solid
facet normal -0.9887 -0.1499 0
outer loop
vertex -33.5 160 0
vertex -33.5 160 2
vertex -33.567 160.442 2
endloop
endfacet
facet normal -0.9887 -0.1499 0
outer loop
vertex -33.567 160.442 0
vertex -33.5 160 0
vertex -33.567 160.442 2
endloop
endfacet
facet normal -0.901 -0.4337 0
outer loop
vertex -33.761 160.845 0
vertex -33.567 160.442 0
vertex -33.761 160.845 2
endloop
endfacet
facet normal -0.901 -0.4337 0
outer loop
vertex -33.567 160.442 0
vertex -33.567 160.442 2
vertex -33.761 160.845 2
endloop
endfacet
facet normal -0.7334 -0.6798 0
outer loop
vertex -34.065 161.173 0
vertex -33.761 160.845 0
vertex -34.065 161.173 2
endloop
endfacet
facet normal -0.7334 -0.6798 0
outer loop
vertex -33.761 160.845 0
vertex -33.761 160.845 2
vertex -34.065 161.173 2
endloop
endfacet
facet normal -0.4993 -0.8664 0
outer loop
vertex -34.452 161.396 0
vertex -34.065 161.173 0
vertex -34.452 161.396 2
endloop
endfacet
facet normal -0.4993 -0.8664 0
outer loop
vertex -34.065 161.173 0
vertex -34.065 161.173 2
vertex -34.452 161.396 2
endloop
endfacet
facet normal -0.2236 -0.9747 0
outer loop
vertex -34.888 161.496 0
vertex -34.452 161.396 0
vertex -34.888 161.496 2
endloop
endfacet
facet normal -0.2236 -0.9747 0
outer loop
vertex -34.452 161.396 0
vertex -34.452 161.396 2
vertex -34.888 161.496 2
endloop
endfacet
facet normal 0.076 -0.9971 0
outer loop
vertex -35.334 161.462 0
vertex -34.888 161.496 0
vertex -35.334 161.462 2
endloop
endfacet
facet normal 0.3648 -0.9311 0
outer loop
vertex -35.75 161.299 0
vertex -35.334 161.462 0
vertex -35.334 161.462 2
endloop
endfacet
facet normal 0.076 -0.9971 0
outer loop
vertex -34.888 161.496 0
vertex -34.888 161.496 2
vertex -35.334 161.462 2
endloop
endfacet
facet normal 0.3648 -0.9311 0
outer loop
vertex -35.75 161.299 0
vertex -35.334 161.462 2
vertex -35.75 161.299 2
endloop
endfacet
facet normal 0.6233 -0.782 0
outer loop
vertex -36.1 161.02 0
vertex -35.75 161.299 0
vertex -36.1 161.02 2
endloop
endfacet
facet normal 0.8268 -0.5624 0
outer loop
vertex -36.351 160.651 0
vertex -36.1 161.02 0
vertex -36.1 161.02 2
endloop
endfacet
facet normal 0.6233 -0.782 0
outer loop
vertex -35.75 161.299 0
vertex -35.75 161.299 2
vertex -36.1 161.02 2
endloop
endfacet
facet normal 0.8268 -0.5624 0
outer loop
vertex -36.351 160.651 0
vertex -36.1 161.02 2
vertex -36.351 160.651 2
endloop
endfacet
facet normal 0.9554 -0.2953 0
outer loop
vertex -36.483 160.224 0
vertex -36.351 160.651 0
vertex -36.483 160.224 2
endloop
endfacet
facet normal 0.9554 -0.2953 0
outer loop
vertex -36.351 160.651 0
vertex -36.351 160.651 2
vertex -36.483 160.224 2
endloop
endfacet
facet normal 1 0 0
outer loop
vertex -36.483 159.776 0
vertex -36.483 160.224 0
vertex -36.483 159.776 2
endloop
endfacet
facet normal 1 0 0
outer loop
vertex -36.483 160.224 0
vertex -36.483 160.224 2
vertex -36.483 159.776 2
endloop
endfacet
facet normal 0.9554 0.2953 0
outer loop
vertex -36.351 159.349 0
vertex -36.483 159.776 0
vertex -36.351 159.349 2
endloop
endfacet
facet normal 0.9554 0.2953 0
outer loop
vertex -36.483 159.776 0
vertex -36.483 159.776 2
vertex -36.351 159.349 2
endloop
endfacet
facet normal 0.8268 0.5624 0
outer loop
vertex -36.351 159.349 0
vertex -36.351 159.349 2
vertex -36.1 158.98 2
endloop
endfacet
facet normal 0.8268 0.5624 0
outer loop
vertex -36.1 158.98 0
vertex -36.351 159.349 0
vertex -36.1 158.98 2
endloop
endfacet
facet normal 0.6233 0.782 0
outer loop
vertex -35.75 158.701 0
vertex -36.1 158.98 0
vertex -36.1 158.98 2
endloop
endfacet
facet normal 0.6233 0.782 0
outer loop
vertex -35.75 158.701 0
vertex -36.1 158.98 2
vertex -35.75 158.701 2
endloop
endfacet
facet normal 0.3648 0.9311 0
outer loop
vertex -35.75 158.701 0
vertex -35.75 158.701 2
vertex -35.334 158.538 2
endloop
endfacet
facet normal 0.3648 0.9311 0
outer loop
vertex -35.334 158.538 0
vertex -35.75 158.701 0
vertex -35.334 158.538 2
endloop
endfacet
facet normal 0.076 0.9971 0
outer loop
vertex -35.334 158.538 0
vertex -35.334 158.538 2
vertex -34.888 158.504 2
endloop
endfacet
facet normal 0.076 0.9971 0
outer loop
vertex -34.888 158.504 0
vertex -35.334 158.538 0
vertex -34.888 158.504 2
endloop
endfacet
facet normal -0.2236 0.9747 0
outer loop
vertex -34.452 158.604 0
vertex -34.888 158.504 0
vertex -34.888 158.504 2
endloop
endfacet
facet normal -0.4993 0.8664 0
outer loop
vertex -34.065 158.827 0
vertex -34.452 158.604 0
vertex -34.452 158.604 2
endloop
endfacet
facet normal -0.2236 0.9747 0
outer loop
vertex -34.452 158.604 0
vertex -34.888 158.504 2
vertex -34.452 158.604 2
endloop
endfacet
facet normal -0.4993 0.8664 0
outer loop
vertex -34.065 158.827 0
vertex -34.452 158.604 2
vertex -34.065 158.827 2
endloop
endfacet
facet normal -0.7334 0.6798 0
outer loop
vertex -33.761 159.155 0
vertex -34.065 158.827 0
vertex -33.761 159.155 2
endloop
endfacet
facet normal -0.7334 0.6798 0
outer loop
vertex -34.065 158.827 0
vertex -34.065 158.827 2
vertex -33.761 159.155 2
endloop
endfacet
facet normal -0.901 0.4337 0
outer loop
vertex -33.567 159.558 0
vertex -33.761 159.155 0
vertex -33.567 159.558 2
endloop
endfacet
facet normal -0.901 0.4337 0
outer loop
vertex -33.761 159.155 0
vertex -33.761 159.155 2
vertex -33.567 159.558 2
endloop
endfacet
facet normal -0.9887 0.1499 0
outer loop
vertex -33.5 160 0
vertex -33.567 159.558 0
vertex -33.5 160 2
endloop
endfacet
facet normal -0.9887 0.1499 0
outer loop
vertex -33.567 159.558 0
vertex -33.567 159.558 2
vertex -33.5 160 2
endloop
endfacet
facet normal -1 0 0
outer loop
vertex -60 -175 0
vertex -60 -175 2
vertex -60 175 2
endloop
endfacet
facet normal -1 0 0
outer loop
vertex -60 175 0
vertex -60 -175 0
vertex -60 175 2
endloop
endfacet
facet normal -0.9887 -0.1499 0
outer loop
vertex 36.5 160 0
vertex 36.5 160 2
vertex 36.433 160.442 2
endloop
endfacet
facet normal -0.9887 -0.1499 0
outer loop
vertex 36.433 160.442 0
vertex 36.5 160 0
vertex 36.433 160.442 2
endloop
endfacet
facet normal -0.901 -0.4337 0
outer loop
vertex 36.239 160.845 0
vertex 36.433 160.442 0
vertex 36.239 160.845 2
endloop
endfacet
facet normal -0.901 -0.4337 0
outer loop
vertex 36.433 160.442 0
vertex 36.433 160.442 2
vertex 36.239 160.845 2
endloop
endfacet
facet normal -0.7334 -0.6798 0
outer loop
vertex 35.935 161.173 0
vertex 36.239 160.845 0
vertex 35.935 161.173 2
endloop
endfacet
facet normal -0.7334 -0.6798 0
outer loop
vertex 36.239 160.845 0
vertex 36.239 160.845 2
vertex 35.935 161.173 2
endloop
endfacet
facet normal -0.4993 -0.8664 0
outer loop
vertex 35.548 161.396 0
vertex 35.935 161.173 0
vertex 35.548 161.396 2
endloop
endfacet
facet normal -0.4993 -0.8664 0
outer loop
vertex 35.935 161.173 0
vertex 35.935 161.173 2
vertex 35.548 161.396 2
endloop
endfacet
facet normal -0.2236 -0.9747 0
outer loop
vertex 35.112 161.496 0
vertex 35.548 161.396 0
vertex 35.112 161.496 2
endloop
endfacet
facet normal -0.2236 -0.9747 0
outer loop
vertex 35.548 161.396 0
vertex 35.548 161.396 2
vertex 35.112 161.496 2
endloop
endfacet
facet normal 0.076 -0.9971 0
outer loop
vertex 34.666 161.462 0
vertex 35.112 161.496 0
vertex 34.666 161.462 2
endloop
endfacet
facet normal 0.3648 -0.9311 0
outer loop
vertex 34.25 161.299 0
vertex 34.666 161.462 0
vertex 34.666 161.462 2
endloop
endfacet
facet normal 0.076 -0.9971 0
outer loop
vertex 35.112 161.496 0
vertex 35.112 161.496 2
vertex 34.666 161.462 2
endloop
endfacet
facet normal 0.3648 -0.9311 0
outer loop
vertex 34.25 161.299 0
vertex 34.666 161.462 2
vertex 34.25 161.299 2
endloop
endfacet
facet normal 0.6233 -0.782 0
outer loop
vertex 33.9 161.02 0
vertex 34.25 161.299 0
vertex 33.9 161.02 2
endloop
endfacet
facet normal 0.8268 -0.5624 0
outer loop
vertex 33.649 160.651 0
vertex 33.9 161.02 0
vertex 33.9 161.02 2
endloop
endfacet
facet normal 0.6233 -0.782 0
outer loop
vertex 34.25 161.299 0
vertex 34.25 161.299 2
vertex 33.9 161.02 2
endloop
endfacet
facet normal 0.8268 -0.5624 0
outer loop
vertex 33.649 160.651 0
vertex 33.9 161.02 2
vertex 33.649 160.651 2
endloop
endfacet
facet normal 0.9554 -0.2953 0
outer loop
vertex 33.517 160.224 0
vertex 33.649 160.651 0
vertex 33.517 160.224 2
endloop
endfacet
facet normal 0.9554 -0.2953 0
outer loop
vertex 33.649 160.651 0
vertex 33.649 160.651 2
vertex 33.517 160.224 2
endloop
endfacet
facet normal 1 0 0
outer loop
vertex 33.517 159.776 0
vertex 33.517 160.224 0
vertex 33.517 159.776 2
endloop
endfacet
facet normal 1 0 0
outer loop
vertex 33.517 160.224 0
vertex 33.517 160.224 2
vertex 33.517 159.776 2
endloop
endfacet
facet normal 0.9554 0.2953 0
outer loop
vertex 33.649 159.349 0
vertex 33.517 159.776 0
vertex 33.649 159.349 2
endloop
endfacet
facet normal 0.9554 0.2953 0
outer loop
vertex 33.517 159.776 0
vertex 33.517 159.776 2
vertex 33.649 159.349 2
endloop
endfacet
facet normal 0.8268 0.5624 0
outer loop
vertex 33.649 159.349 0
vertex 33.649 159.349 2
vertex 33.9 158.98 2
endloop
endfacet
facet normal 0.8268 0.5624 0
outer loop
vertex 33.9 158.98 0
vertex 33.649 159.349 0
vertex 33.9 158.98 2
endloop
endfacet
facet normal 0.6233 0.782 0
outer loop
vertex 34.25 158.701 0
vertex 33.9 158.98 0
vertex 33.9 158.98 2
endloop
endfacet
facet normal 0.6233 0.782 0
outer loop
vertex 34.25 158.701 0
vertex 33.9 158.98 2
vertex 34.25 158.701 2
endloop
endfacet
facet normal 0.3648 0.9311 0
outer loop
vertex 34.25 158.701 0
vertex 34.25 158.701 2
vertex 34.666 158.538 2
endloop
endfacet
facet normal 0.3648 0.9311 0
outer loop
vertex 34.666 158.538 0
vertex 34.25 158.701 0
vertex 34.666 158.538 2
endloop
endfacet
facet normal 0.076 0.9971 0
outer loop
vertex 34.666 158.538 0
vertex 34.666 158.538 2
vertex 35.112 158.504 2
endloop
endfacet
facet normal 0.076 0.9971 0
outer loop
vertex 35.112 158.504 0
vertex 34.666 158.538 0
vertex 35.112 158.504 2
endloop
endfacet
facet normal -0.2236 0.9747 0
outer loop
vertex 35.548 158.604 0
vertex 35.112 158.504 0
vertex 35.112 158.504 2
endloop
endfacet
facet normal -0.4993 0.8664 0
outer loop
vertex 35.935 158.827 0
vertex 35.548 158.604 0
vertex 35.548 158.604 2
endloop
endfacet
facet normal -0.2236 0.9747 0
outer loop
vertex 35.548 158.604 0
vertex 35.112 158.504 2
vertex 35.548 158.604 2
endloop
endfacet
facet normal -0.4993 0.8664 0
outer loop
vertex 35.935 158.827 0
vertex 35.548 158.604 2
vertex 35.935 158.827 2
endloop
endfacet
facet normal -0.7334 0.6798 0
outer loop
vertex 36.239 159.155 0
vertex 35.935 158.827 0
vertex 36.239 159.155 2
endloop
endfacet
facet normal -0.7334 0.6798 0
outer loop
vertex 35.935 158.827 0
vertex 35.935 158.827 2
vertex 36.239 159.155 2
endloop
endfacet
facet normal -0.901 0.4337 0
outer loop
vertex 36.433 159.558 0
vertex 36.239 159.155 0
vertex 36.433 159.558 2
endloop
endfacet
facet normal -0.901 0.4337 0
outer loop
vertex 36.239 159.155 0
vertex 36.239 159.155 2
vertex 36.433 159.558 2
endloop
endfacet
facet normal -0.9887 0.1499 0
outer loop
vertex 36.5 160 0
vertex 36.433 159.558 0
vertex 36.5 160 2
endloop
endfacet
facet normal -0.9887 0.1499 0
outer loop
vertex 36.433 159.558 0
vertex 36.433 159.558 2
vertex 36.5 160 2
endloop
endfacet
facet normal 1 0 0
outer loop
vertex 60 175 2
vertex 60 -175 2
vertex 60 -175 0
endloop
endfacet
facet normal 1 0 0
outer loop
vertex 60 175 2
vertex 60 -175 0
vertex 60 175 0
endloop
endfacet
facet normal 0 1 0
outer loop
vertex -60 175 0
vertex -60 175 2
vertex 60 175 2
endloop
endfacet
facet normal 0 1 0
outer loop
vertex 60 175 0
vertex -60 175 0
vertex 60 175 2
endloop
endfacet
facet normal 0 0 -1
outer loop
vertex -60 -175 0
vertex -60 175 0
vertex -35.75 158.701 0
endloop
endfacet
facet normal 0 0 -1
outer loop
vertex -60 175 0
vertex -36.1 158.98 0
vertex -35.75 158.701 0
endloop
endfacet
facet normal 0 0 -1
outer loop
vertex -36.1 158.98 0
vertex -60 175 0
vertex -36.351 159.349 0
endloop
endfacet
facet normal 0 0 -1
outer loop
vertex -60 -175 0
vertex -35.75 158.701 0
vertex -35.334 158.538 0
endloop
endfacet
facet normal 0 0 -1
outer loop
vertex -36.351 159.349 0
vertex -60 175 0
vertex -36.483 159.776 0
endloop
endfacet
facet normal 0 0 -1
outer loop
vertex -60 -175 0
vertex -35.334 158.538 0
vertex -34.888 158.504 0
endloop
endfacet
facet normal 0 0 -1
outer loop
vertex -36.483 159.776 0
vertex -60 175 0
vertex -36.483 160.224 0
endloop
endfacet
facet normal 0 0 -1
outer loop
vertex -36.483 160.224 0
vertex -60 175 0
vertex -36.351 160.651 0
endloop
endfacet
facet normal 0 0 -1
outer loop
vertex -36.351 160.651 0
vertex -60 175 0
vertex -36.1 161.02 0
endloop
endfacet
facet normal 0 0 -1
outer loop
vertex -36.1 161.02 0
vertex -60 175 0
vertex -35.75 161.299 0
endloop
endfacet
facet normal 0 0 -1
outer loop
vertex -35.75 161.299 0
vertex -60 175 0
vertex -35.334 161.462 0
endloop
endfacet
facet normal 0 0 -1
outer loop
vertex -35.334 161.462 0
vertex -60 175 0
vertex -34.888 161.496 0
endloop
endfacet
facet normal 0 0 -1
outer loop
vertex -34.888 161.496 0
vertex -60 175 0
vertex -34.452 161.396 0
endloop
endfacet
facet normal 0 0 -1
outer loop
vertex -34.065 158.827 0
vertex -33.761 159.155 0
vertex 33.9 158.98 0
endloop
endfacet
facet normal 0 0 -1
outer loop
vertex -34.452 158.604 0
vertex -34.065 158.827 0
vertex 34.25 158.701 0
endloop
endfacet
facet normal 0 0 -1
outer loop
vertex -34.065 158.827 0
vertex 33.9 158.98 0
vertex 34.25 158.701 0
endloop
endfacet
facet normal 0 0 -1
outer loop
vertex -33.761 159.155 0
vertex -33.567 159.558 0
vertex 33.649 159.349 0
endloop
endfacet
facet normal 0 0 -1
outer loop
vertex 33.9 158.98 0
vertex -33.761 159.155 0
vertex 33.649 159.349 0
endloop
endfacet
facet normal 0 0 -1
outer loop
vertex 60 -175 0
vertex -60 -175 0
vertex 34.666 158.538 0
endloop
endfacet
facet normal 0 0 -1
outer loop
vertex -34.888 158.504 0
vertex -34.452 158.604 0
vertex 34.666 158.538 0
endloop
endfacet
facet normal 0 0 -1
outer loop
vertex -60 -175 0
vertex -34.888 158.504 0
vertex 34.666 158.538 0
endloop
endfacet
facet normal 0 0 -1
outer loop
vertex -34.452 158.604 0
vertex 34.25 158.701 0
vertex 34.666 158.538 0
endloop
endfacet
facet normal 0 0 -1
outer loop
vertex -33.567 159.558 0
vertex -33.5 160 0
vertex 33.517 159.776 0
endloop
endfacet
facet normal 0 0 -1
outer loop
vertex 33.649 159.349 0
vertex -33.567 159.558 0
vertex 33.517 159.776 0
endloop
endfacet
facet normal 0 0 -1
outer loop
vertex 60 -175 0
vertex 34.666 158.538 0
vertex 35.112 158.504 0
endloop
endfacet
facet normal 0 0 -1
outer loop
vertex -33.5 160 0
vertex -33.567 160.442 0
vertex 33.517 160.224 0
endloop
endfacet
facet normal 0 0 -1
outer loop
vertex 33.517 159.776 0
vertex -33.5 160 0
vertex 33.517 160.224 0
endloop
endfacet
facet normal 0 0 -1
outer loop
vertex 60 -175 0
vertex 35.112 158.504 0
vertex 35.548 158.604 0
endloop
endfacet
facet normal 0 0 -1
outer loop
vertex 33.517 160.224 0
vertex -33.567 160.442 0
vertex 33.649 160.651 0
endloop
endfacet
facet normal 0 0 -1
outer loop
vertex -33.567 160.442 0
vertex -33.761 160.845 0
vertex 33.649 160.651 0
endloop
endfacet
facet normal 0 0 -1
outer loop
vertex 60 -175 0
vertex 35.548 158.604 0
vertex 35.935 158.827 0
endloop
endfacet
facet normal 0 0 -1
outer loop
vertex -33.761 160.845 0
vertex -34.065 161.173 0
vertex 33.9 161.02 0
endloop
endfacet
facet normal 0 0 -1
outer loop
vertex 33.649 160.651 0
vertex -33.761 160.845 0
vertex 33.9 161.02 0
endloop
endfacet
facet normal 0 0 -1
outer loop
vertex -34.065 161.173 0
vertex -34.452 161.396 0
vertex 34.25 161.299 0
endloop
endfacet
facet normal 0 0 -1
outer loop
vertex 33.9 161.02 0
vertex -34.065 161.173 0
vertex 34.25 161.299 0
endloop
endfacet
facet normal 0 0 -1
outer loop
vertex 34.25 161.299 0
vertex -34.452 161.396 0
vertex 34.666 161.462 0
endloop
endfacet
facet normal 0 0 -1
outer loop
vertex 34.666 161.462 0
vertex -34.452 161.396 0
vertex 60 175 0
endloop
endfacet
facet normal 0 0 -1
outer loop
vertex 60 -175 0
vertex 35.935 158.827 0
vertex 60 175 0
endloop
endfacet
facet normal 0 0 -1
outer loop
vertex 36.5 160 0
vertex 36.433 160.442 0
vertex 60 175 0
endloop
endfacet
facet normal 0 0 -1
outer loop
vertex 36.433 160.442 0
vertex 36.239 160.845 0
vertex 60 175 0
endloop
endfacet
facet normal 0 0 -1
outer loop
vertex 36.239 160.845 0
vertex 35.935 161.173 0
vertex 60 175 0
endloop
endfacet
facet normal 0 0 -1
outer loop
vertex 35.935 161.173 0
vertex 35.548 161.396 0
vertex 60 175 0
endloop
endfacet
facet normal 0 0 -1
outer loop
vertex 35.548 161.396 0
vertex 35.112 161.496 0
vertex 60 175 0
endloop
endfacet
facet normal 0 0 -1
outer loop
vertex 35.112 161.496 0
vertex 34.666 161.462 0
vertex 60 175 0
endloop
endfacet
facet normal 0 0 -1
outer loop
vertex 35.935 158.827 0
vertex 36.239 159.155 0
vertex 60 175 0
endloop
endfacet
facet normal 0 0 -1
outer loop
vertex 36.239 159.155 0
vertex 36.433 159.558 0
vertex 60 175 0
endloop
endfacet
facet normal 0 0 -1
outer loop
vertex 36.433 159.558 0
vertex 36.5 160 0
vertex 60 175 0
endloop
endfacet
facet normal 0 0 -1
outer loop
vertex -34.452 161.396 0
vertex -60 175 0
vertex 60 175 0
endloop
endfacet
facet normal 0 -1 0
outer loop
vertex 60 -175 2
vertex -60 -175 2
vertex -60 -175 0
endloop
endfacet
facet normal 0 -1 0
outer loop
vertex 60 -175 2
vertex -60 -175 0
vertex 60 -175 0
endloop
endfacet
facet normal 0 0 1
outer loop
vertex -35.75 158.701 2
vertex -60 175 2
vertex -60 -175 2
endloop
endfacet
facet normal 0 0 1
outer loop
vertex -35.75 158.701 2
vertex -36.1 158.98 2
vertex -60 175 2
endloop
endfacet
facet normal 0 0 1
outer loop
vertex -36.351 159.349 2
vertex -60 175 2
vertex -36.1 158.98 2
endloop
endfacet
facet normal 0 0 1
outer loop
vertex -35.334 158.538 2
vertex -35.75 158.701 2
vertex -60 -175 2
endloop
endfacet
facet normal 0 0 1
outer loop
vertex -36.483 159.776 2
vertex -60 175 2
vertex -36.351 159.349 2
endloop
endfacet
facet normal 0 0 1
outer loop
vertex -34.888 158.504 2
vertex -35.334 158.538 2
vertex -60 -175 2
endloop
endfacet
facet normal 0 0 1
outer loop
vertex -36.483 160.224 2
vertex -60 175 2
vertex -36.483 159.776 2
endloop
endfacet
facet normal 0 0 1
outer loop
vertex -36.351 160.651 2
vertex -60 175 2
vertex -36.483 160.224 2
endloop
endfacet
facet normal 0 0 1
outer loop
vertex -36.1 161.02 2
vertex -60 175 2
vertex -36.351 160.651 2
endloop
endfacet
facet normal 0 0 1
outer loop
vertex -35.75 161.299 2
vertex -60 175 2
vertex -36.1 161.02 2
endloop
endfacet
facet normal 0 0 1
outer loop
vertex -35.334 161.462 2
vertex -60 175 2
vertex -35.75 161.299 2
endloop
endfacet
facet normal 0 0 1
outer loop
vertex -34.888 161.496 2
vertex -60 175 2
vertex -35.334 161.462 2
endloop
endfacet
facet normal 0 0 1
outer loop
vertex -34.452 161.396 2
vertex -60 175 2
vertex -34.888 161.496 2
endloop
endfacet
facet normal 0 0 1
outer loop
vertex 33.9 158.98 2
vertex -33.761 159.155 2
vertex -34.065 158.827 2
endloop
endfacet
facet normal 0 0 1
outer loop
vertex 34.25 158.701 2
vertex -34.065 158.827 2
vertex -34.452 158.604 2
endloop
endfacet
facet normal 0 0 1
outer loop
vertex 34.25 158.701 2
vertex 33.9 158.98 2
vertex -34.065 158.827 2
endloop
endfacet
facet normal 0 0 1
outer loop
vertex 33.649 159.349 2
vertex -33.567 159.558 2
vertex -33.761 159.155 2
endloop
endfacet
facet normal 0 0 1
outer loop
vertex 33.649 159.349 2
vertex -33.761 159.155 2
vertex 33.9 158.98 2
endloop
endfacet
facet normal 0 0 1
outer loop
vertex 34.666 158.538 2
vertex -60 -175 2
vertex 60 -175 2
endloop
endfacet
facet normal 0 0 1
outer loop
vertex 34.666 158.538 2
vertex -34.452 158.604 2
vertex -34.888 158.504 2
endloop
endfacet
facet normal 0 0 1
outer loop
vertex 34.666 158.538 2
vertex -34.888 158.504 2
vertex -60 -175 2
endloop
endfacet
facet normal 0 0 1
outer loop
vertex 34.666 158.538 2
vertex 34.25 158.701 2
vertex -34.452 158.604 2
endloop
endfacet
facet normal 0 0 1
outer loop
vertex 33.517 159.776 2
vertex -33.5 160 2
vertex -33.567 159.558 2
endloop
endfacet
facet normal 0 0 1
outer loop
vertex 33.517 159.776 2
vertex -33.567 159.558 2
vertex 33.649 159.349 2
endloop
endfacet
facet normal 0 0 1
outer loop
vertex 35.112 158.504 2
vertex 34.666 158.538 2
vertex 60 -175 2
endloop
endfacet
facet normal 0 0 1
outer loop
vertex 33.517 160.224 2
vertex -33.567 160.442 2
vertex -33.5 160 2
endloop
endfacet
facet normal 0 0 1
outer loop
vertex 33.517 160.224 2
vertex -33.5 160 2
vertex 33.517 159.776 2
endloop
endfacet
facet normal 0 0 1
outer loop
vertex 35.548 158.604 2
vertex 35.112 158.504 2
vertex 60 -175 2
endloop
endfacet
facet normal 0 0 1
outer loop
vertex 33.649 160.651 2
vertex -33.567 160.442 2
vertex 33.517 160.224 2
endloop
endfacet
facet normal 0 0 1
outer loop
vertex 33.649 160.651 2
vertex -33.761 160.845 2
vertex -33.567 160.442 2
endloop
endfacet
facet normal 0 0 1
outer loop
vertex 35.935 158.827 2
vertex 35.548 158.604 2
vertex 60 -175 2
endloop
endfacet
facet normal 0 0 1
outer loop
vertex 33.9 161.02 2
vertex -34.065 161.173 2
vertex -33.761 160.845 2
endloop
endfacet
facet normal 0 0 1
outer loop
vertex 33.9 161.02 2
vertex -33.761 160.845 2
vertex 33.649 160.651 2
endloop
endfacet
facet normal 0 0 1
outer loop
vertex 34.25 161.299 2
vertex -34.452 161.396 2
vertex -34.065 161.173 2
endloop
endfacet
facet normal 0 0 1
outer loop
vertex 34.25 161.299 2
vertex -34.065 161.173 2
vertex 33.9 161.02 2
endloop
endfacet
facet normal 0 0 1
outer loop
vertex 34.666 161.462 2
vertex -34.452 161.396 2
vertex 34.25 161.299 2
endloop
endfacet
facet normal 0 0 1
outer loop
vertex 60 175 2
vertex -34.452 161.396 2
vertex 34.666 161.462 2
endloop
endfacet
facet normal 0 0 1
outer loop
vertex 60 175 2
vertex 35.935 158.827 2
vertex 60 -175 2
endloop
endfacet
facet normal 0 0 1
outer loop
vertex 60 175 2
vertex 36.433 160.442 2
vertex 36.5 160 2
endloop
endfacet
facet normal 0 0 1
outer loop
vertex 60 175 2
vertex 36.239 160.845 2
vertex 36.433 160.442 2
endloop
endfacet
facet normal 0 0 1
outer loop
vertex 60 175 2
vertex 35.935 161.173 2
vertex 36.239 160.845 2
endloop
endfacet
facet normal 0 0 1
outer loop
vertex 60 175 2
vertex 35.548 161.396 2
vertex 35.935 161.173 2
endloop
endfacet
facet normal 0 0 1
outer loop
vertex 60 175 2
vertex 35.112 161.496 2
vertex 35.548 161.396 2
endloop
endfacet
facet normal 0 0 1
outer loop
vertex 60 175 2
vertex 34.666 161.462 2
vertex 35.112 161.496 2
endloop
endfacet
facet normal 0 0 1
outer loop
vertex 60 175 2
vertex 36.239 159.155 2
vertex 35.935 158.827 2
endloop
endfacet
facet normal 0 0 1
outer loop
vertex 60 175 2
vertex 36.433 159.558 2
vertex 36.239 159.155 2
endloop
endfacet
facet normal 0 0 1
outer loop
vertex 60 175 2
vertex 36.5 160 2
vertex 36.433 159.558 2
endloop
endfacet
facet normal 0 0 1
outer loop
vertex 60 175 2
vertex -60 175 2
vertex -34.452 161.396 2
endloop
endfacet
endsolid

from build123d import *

# Parameters (mm, degrees)
SKETCH_1_W      = 120
SKETCH_1_H      = 350
SKETCH_1_R      = 1.5
EXTRUDE_1_DEPTH = 2


with BuildPart() as part:
    # 草图1 → 凸台-拉伸1 (new body)
    with BuildSketch(Plane.XY.offset(2)):
        Rectangle(SKETCH_1_W, SKETCH_1_H)
        with Locations((35, 160)):
            Circle(SKETCH_1_R, mode=Mode.SUBTRACT)
        with Locations((-35, 160)):
            Circle(SKETCH_1_R, mode=Mode.SUBTRACT)
    extrude(amount=-EXTRUDE_1_DEPTH)


solid = part.part
